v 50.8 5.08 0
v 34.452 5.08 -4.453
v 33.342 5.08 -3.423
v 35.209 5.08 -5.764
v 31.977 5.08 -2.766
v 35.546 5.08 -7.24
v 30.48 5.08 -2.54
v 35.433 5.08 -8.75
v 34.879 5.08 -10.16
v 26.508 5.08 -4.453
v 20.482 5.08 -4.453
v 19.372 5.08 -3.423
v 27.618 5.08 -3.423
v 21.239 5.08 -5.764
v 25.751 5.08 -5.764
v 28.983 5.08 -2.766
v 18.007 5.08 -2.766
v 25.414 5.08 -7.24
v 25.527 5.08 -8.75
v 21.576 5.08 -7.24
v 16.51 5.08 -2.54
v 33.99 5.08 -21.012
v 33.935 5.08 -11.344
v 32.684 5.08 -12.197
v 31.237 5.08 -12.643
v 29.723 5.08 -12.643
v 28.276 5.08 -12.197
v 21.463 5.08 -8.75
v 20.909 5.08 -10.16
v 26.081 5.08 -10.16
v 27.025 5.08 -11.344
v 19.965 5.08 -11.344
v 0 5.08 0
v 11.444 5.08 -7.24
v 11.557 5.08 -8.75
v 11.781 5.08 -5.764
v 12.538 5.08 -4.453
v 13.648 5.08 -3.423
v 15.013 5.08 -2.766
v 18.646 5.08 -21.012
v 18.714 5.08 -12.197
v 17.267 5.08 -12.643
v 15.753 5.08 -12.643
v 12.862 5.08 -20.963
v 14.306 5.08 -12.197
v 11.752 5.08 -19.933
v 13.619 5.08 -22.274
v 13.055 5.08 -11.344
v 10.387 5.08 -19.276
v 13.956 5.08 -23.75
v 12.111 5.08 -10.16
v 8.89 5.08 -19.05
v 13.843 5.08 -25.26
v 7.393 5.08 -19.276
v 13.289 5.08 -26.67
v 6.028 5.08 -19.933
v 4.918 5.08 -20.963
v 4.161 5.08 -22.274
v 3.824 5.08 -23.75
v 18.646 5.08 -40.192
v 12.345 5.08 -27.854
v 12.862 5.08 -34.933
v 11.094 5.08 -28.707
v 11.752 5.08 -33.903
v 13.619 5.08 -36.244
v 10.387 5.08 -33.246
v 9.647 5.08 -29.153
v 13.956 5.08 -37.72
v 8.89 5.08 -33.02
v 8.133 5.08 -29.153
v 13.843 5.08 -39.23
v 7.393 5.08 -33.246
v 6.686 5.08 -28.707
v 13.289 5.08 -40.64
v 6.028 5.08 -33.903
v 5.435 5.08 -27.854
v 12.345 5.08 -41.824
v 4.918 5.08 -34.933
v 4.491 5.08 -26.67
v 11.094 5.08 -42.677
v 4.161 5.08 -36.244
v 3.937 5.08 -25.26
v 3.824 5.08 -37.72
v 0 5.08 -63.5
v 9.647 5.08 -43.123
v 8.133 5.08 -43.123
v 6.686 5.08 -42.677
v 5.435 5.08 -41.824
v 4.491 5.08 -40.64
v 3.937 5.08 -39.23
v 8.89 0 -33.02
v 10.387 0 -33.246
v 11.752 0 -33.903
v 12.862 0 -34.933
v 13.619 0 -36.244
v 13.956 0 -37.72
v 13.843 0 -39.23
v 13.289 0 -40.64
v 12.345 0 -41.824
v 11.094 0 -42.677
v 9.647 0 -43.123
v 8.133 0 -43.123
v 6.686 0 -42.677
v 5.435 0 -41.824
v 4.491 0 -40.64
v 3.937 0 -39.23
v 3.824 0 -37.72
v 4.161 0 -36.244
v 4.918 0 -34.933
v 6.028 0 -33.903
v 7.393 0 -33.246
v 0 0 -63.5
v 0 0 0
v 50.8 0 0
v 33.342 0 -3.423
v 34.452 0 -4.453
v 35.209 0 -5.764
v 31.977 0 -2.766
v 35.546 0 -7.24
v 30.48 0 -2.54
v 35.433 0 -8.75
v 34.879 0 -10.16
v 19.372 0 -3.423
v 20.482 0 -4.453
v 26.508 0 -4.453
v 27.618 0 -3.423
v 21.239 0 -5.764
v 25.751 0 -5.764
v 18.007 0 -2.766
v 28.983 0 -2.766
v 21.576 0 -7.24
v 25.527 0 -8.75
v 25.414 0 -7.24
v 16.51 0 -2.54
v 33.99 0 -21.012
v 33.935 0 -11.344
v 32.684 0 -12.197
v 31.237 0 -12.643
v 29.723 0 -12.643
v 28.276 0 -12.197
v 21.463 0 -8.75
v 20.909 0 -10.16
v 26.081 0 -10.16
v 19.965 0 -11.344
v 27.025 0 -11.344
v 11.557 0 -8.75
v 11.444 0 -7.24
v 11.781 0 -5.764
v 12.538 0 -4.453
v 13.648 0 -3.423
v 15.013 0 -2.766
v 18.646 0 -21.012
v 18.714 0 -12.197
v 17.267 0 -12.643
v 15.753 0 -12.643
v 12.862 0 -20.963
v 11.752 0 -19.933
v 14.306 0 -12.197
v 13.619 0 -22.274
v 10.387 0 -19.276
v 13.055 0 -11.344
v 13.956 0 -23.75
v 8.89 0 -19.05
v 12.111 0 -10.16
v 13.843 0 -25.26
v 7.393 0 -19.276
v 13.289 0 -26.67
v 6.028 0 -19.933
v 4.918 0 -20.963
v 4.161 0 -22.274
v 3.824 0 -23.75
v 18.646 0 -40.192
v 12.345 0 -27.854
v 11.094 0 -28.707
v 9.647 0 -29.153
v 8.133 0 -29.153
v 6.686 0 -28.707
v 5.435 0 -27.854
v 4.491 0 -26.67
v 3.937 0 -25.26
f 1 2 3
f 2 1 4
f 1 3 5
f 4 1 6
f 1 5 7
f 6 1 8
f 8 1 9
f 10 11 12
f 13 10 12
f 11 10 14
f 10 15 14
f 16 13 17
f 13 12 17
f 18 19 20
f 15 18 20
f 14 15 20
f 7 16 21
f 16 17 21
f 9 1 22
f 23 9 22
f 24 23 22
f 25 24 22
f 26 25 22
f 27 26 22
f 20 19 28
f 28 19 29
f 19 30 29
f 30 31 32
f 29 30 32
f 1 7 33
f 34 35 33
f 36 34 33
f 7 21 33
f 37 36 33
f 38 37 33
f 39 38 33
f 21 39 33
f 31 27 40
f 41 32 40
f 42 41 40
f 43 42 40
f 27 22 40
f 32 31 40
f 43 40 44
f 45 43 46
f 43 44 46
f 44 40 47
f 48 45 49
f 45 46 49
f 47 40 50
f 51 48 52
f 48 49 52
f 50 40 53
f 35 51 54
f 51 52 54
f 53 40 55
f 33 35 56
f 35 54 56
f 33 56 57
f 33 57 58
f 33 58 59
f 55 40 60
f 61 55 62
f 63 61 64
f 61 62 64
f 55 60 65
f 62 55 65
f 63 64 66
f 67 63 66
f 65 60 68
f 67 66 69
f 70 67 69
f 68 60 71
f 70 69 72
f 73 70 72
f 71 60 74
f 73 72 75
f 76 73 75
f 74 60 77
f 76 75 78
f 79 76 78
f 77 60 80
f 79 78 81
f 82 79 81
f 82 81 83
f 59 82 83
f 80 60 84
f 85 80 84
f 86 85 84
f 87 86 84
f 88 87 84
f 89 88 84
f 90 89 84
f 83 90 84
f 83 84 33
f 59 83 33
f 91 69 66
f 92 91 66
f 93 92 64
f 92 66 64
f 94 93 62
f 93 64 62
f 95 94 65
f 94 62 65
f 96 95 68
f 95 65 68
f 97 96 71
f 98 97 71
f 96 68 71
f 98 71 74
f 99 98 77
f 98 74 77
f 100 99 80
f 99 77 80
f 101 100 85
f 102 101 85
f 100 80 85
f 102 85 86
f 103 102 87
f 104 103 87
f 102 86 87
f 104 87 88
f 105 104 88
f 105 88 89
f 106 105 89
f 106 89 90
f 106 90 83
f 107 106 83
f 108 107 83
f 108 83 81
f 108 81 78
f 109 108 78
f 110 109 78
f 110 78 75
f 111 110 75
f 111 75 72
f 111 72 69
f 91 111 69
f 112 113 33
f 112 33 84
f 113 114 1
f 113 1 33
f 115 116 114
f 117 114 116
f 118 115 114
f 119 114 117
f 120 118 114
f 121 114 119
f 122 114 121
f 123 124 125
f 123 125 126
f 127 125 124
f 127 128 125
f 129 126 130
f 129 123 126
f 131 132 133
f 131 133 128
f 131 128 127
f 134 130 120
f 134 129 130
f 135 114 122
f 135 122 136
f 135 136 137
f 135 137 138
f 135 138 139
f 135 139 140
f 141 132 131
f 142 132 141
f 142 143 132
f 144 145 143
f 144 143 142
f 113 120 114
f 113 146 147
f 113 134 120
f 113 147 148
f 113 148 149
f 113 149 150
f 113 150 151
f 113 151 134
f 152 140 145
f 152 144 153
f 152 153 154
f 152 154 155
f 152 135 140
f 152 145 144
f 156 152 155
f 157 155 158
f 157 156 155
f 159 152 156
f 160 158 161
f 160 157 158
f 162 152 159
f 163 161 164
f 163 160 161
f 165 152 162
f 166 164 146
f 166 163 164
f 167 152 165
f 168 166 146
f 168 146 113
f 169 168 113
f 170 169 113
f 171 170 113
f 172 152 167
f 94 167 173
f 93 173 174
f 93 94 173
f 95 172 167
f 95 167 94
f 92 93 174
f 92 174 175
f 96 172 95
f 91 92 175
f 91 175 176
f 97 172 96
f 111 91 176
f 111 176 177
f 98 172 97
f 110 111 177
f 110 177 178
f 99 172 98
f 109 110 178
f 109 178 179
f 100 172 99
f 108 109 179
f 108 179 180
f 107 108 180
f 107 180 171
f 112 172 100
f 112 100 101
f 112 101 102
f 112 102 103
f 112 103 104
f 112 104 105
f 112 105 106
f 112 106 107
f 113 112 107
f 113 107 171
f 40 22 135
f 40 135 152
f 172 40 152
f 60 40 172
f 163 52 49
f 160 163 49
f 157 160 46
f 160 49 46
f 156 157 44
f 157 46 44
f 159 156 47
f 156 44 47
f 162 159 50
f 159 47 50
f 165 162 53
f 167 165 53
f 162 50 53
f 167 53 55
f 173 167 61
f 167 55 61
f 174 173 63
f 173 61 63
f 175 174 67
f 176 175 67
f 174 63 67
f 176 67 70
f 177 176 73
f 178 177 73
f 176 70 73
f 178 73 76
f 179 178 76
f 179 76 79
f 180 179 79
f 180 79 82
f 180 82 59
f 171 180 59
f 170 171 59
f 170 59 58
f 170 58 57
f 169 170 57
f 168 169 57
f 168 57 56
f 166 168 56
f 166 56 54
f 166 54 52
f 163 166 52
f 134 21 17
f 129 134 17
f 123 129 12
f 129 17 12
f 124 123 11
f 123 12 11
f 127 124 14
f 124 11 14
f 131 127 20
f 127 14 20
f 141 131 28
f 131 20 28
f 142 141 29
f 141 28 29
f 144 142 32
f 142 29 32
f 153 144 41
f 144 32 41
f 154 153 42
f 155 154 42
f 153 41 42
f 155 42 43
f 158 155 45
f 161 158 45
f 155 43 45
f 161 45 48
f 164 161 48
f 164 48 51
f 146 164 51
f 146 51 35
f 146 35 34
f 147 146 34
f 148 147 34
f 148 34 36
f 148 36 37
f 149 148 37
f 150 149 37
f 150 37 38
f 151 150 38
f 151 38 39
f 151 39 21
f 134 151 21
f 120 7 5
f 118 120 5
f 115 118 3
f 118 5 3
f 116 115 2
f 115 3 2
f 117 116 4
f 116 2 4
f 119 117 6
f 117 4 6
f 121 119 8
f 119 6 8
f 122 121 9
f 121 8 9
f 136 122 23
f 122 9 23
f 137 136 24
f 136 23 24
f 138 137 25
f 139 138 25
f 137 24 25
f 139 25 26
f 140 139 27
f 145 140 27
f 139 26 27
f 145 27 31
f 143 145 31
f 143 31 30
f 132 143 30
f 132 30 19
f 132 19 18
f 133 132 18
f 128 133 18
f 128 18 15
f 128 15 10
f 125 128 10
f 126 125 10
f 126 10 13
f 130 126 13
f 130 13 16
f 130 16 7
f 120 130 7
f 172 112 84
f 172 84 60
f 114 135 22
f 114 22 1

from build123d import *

# Parameters (mm, degrees)
BOSS_EXTRUDE1_DEPTH = 5.08
SKETCH2_R           = 5.08
CUT_EXTRUDE1_DEPTH  = 7.62
CUT_EXTRUDE2_DEPTH  = 7.62


with BuildPart() as part:
    # Sketch1 → Boss-Extrude1 (new body)
    with BuildSketch(Plane(origin=(0, 0, 0), x_dir=(1, 0, 0), z_dir=(0, 1, 0))):
        Polygon((0, 0), (0, 63.5), (50.8, 0), align=None)
    extrude(amount=BOSS_EXTRUDE1_DEPTH)

    # Sketch2 → Cut-Extrude1 (cut)
    with BuildSketch(Plane(origin=(0, 5.08, 0), x_dir=(1, 0, 0), z_dir=(0, 1, 0))):
        with Locations(Location((8.89, 24.13, 0), (0, 0, 270))):
            Circle(SKETCH2_R)
        with Locations(Location((8.89, 38.1, 0), (0, 0, 270))):
            Circle(SKETCH2_R)
        with Locations(Location((16.51, 7.62, 0), (0, 0, 270))):
            Circle(SKETCH2_R)
        with Locations(Location((30.48, 7.62, 0), (0, 0, 270))):
            Circle(SKETCH2_R)
    extrude(amount=-CUT_EXTRUDE1_DEPTH, mode=Mode.SUBTRACT)

    # Sketch3 → Cut-Extrude2 (cut)
    with BuildSketch(Plane(origin=(0, 5.08, 0), x_dir=(1, 0, 0), z_dir=(0, 1, 0))):
        Polygon((18.646117634, 21.012186882), (18.646117634, 40.192352958), (33.990250495, 21.012186882), align=None)
    extrude(amount=-CUT_EXTRUDE2_DEPTH, mode=Mode.SUBTRACT)


solid = part.part
